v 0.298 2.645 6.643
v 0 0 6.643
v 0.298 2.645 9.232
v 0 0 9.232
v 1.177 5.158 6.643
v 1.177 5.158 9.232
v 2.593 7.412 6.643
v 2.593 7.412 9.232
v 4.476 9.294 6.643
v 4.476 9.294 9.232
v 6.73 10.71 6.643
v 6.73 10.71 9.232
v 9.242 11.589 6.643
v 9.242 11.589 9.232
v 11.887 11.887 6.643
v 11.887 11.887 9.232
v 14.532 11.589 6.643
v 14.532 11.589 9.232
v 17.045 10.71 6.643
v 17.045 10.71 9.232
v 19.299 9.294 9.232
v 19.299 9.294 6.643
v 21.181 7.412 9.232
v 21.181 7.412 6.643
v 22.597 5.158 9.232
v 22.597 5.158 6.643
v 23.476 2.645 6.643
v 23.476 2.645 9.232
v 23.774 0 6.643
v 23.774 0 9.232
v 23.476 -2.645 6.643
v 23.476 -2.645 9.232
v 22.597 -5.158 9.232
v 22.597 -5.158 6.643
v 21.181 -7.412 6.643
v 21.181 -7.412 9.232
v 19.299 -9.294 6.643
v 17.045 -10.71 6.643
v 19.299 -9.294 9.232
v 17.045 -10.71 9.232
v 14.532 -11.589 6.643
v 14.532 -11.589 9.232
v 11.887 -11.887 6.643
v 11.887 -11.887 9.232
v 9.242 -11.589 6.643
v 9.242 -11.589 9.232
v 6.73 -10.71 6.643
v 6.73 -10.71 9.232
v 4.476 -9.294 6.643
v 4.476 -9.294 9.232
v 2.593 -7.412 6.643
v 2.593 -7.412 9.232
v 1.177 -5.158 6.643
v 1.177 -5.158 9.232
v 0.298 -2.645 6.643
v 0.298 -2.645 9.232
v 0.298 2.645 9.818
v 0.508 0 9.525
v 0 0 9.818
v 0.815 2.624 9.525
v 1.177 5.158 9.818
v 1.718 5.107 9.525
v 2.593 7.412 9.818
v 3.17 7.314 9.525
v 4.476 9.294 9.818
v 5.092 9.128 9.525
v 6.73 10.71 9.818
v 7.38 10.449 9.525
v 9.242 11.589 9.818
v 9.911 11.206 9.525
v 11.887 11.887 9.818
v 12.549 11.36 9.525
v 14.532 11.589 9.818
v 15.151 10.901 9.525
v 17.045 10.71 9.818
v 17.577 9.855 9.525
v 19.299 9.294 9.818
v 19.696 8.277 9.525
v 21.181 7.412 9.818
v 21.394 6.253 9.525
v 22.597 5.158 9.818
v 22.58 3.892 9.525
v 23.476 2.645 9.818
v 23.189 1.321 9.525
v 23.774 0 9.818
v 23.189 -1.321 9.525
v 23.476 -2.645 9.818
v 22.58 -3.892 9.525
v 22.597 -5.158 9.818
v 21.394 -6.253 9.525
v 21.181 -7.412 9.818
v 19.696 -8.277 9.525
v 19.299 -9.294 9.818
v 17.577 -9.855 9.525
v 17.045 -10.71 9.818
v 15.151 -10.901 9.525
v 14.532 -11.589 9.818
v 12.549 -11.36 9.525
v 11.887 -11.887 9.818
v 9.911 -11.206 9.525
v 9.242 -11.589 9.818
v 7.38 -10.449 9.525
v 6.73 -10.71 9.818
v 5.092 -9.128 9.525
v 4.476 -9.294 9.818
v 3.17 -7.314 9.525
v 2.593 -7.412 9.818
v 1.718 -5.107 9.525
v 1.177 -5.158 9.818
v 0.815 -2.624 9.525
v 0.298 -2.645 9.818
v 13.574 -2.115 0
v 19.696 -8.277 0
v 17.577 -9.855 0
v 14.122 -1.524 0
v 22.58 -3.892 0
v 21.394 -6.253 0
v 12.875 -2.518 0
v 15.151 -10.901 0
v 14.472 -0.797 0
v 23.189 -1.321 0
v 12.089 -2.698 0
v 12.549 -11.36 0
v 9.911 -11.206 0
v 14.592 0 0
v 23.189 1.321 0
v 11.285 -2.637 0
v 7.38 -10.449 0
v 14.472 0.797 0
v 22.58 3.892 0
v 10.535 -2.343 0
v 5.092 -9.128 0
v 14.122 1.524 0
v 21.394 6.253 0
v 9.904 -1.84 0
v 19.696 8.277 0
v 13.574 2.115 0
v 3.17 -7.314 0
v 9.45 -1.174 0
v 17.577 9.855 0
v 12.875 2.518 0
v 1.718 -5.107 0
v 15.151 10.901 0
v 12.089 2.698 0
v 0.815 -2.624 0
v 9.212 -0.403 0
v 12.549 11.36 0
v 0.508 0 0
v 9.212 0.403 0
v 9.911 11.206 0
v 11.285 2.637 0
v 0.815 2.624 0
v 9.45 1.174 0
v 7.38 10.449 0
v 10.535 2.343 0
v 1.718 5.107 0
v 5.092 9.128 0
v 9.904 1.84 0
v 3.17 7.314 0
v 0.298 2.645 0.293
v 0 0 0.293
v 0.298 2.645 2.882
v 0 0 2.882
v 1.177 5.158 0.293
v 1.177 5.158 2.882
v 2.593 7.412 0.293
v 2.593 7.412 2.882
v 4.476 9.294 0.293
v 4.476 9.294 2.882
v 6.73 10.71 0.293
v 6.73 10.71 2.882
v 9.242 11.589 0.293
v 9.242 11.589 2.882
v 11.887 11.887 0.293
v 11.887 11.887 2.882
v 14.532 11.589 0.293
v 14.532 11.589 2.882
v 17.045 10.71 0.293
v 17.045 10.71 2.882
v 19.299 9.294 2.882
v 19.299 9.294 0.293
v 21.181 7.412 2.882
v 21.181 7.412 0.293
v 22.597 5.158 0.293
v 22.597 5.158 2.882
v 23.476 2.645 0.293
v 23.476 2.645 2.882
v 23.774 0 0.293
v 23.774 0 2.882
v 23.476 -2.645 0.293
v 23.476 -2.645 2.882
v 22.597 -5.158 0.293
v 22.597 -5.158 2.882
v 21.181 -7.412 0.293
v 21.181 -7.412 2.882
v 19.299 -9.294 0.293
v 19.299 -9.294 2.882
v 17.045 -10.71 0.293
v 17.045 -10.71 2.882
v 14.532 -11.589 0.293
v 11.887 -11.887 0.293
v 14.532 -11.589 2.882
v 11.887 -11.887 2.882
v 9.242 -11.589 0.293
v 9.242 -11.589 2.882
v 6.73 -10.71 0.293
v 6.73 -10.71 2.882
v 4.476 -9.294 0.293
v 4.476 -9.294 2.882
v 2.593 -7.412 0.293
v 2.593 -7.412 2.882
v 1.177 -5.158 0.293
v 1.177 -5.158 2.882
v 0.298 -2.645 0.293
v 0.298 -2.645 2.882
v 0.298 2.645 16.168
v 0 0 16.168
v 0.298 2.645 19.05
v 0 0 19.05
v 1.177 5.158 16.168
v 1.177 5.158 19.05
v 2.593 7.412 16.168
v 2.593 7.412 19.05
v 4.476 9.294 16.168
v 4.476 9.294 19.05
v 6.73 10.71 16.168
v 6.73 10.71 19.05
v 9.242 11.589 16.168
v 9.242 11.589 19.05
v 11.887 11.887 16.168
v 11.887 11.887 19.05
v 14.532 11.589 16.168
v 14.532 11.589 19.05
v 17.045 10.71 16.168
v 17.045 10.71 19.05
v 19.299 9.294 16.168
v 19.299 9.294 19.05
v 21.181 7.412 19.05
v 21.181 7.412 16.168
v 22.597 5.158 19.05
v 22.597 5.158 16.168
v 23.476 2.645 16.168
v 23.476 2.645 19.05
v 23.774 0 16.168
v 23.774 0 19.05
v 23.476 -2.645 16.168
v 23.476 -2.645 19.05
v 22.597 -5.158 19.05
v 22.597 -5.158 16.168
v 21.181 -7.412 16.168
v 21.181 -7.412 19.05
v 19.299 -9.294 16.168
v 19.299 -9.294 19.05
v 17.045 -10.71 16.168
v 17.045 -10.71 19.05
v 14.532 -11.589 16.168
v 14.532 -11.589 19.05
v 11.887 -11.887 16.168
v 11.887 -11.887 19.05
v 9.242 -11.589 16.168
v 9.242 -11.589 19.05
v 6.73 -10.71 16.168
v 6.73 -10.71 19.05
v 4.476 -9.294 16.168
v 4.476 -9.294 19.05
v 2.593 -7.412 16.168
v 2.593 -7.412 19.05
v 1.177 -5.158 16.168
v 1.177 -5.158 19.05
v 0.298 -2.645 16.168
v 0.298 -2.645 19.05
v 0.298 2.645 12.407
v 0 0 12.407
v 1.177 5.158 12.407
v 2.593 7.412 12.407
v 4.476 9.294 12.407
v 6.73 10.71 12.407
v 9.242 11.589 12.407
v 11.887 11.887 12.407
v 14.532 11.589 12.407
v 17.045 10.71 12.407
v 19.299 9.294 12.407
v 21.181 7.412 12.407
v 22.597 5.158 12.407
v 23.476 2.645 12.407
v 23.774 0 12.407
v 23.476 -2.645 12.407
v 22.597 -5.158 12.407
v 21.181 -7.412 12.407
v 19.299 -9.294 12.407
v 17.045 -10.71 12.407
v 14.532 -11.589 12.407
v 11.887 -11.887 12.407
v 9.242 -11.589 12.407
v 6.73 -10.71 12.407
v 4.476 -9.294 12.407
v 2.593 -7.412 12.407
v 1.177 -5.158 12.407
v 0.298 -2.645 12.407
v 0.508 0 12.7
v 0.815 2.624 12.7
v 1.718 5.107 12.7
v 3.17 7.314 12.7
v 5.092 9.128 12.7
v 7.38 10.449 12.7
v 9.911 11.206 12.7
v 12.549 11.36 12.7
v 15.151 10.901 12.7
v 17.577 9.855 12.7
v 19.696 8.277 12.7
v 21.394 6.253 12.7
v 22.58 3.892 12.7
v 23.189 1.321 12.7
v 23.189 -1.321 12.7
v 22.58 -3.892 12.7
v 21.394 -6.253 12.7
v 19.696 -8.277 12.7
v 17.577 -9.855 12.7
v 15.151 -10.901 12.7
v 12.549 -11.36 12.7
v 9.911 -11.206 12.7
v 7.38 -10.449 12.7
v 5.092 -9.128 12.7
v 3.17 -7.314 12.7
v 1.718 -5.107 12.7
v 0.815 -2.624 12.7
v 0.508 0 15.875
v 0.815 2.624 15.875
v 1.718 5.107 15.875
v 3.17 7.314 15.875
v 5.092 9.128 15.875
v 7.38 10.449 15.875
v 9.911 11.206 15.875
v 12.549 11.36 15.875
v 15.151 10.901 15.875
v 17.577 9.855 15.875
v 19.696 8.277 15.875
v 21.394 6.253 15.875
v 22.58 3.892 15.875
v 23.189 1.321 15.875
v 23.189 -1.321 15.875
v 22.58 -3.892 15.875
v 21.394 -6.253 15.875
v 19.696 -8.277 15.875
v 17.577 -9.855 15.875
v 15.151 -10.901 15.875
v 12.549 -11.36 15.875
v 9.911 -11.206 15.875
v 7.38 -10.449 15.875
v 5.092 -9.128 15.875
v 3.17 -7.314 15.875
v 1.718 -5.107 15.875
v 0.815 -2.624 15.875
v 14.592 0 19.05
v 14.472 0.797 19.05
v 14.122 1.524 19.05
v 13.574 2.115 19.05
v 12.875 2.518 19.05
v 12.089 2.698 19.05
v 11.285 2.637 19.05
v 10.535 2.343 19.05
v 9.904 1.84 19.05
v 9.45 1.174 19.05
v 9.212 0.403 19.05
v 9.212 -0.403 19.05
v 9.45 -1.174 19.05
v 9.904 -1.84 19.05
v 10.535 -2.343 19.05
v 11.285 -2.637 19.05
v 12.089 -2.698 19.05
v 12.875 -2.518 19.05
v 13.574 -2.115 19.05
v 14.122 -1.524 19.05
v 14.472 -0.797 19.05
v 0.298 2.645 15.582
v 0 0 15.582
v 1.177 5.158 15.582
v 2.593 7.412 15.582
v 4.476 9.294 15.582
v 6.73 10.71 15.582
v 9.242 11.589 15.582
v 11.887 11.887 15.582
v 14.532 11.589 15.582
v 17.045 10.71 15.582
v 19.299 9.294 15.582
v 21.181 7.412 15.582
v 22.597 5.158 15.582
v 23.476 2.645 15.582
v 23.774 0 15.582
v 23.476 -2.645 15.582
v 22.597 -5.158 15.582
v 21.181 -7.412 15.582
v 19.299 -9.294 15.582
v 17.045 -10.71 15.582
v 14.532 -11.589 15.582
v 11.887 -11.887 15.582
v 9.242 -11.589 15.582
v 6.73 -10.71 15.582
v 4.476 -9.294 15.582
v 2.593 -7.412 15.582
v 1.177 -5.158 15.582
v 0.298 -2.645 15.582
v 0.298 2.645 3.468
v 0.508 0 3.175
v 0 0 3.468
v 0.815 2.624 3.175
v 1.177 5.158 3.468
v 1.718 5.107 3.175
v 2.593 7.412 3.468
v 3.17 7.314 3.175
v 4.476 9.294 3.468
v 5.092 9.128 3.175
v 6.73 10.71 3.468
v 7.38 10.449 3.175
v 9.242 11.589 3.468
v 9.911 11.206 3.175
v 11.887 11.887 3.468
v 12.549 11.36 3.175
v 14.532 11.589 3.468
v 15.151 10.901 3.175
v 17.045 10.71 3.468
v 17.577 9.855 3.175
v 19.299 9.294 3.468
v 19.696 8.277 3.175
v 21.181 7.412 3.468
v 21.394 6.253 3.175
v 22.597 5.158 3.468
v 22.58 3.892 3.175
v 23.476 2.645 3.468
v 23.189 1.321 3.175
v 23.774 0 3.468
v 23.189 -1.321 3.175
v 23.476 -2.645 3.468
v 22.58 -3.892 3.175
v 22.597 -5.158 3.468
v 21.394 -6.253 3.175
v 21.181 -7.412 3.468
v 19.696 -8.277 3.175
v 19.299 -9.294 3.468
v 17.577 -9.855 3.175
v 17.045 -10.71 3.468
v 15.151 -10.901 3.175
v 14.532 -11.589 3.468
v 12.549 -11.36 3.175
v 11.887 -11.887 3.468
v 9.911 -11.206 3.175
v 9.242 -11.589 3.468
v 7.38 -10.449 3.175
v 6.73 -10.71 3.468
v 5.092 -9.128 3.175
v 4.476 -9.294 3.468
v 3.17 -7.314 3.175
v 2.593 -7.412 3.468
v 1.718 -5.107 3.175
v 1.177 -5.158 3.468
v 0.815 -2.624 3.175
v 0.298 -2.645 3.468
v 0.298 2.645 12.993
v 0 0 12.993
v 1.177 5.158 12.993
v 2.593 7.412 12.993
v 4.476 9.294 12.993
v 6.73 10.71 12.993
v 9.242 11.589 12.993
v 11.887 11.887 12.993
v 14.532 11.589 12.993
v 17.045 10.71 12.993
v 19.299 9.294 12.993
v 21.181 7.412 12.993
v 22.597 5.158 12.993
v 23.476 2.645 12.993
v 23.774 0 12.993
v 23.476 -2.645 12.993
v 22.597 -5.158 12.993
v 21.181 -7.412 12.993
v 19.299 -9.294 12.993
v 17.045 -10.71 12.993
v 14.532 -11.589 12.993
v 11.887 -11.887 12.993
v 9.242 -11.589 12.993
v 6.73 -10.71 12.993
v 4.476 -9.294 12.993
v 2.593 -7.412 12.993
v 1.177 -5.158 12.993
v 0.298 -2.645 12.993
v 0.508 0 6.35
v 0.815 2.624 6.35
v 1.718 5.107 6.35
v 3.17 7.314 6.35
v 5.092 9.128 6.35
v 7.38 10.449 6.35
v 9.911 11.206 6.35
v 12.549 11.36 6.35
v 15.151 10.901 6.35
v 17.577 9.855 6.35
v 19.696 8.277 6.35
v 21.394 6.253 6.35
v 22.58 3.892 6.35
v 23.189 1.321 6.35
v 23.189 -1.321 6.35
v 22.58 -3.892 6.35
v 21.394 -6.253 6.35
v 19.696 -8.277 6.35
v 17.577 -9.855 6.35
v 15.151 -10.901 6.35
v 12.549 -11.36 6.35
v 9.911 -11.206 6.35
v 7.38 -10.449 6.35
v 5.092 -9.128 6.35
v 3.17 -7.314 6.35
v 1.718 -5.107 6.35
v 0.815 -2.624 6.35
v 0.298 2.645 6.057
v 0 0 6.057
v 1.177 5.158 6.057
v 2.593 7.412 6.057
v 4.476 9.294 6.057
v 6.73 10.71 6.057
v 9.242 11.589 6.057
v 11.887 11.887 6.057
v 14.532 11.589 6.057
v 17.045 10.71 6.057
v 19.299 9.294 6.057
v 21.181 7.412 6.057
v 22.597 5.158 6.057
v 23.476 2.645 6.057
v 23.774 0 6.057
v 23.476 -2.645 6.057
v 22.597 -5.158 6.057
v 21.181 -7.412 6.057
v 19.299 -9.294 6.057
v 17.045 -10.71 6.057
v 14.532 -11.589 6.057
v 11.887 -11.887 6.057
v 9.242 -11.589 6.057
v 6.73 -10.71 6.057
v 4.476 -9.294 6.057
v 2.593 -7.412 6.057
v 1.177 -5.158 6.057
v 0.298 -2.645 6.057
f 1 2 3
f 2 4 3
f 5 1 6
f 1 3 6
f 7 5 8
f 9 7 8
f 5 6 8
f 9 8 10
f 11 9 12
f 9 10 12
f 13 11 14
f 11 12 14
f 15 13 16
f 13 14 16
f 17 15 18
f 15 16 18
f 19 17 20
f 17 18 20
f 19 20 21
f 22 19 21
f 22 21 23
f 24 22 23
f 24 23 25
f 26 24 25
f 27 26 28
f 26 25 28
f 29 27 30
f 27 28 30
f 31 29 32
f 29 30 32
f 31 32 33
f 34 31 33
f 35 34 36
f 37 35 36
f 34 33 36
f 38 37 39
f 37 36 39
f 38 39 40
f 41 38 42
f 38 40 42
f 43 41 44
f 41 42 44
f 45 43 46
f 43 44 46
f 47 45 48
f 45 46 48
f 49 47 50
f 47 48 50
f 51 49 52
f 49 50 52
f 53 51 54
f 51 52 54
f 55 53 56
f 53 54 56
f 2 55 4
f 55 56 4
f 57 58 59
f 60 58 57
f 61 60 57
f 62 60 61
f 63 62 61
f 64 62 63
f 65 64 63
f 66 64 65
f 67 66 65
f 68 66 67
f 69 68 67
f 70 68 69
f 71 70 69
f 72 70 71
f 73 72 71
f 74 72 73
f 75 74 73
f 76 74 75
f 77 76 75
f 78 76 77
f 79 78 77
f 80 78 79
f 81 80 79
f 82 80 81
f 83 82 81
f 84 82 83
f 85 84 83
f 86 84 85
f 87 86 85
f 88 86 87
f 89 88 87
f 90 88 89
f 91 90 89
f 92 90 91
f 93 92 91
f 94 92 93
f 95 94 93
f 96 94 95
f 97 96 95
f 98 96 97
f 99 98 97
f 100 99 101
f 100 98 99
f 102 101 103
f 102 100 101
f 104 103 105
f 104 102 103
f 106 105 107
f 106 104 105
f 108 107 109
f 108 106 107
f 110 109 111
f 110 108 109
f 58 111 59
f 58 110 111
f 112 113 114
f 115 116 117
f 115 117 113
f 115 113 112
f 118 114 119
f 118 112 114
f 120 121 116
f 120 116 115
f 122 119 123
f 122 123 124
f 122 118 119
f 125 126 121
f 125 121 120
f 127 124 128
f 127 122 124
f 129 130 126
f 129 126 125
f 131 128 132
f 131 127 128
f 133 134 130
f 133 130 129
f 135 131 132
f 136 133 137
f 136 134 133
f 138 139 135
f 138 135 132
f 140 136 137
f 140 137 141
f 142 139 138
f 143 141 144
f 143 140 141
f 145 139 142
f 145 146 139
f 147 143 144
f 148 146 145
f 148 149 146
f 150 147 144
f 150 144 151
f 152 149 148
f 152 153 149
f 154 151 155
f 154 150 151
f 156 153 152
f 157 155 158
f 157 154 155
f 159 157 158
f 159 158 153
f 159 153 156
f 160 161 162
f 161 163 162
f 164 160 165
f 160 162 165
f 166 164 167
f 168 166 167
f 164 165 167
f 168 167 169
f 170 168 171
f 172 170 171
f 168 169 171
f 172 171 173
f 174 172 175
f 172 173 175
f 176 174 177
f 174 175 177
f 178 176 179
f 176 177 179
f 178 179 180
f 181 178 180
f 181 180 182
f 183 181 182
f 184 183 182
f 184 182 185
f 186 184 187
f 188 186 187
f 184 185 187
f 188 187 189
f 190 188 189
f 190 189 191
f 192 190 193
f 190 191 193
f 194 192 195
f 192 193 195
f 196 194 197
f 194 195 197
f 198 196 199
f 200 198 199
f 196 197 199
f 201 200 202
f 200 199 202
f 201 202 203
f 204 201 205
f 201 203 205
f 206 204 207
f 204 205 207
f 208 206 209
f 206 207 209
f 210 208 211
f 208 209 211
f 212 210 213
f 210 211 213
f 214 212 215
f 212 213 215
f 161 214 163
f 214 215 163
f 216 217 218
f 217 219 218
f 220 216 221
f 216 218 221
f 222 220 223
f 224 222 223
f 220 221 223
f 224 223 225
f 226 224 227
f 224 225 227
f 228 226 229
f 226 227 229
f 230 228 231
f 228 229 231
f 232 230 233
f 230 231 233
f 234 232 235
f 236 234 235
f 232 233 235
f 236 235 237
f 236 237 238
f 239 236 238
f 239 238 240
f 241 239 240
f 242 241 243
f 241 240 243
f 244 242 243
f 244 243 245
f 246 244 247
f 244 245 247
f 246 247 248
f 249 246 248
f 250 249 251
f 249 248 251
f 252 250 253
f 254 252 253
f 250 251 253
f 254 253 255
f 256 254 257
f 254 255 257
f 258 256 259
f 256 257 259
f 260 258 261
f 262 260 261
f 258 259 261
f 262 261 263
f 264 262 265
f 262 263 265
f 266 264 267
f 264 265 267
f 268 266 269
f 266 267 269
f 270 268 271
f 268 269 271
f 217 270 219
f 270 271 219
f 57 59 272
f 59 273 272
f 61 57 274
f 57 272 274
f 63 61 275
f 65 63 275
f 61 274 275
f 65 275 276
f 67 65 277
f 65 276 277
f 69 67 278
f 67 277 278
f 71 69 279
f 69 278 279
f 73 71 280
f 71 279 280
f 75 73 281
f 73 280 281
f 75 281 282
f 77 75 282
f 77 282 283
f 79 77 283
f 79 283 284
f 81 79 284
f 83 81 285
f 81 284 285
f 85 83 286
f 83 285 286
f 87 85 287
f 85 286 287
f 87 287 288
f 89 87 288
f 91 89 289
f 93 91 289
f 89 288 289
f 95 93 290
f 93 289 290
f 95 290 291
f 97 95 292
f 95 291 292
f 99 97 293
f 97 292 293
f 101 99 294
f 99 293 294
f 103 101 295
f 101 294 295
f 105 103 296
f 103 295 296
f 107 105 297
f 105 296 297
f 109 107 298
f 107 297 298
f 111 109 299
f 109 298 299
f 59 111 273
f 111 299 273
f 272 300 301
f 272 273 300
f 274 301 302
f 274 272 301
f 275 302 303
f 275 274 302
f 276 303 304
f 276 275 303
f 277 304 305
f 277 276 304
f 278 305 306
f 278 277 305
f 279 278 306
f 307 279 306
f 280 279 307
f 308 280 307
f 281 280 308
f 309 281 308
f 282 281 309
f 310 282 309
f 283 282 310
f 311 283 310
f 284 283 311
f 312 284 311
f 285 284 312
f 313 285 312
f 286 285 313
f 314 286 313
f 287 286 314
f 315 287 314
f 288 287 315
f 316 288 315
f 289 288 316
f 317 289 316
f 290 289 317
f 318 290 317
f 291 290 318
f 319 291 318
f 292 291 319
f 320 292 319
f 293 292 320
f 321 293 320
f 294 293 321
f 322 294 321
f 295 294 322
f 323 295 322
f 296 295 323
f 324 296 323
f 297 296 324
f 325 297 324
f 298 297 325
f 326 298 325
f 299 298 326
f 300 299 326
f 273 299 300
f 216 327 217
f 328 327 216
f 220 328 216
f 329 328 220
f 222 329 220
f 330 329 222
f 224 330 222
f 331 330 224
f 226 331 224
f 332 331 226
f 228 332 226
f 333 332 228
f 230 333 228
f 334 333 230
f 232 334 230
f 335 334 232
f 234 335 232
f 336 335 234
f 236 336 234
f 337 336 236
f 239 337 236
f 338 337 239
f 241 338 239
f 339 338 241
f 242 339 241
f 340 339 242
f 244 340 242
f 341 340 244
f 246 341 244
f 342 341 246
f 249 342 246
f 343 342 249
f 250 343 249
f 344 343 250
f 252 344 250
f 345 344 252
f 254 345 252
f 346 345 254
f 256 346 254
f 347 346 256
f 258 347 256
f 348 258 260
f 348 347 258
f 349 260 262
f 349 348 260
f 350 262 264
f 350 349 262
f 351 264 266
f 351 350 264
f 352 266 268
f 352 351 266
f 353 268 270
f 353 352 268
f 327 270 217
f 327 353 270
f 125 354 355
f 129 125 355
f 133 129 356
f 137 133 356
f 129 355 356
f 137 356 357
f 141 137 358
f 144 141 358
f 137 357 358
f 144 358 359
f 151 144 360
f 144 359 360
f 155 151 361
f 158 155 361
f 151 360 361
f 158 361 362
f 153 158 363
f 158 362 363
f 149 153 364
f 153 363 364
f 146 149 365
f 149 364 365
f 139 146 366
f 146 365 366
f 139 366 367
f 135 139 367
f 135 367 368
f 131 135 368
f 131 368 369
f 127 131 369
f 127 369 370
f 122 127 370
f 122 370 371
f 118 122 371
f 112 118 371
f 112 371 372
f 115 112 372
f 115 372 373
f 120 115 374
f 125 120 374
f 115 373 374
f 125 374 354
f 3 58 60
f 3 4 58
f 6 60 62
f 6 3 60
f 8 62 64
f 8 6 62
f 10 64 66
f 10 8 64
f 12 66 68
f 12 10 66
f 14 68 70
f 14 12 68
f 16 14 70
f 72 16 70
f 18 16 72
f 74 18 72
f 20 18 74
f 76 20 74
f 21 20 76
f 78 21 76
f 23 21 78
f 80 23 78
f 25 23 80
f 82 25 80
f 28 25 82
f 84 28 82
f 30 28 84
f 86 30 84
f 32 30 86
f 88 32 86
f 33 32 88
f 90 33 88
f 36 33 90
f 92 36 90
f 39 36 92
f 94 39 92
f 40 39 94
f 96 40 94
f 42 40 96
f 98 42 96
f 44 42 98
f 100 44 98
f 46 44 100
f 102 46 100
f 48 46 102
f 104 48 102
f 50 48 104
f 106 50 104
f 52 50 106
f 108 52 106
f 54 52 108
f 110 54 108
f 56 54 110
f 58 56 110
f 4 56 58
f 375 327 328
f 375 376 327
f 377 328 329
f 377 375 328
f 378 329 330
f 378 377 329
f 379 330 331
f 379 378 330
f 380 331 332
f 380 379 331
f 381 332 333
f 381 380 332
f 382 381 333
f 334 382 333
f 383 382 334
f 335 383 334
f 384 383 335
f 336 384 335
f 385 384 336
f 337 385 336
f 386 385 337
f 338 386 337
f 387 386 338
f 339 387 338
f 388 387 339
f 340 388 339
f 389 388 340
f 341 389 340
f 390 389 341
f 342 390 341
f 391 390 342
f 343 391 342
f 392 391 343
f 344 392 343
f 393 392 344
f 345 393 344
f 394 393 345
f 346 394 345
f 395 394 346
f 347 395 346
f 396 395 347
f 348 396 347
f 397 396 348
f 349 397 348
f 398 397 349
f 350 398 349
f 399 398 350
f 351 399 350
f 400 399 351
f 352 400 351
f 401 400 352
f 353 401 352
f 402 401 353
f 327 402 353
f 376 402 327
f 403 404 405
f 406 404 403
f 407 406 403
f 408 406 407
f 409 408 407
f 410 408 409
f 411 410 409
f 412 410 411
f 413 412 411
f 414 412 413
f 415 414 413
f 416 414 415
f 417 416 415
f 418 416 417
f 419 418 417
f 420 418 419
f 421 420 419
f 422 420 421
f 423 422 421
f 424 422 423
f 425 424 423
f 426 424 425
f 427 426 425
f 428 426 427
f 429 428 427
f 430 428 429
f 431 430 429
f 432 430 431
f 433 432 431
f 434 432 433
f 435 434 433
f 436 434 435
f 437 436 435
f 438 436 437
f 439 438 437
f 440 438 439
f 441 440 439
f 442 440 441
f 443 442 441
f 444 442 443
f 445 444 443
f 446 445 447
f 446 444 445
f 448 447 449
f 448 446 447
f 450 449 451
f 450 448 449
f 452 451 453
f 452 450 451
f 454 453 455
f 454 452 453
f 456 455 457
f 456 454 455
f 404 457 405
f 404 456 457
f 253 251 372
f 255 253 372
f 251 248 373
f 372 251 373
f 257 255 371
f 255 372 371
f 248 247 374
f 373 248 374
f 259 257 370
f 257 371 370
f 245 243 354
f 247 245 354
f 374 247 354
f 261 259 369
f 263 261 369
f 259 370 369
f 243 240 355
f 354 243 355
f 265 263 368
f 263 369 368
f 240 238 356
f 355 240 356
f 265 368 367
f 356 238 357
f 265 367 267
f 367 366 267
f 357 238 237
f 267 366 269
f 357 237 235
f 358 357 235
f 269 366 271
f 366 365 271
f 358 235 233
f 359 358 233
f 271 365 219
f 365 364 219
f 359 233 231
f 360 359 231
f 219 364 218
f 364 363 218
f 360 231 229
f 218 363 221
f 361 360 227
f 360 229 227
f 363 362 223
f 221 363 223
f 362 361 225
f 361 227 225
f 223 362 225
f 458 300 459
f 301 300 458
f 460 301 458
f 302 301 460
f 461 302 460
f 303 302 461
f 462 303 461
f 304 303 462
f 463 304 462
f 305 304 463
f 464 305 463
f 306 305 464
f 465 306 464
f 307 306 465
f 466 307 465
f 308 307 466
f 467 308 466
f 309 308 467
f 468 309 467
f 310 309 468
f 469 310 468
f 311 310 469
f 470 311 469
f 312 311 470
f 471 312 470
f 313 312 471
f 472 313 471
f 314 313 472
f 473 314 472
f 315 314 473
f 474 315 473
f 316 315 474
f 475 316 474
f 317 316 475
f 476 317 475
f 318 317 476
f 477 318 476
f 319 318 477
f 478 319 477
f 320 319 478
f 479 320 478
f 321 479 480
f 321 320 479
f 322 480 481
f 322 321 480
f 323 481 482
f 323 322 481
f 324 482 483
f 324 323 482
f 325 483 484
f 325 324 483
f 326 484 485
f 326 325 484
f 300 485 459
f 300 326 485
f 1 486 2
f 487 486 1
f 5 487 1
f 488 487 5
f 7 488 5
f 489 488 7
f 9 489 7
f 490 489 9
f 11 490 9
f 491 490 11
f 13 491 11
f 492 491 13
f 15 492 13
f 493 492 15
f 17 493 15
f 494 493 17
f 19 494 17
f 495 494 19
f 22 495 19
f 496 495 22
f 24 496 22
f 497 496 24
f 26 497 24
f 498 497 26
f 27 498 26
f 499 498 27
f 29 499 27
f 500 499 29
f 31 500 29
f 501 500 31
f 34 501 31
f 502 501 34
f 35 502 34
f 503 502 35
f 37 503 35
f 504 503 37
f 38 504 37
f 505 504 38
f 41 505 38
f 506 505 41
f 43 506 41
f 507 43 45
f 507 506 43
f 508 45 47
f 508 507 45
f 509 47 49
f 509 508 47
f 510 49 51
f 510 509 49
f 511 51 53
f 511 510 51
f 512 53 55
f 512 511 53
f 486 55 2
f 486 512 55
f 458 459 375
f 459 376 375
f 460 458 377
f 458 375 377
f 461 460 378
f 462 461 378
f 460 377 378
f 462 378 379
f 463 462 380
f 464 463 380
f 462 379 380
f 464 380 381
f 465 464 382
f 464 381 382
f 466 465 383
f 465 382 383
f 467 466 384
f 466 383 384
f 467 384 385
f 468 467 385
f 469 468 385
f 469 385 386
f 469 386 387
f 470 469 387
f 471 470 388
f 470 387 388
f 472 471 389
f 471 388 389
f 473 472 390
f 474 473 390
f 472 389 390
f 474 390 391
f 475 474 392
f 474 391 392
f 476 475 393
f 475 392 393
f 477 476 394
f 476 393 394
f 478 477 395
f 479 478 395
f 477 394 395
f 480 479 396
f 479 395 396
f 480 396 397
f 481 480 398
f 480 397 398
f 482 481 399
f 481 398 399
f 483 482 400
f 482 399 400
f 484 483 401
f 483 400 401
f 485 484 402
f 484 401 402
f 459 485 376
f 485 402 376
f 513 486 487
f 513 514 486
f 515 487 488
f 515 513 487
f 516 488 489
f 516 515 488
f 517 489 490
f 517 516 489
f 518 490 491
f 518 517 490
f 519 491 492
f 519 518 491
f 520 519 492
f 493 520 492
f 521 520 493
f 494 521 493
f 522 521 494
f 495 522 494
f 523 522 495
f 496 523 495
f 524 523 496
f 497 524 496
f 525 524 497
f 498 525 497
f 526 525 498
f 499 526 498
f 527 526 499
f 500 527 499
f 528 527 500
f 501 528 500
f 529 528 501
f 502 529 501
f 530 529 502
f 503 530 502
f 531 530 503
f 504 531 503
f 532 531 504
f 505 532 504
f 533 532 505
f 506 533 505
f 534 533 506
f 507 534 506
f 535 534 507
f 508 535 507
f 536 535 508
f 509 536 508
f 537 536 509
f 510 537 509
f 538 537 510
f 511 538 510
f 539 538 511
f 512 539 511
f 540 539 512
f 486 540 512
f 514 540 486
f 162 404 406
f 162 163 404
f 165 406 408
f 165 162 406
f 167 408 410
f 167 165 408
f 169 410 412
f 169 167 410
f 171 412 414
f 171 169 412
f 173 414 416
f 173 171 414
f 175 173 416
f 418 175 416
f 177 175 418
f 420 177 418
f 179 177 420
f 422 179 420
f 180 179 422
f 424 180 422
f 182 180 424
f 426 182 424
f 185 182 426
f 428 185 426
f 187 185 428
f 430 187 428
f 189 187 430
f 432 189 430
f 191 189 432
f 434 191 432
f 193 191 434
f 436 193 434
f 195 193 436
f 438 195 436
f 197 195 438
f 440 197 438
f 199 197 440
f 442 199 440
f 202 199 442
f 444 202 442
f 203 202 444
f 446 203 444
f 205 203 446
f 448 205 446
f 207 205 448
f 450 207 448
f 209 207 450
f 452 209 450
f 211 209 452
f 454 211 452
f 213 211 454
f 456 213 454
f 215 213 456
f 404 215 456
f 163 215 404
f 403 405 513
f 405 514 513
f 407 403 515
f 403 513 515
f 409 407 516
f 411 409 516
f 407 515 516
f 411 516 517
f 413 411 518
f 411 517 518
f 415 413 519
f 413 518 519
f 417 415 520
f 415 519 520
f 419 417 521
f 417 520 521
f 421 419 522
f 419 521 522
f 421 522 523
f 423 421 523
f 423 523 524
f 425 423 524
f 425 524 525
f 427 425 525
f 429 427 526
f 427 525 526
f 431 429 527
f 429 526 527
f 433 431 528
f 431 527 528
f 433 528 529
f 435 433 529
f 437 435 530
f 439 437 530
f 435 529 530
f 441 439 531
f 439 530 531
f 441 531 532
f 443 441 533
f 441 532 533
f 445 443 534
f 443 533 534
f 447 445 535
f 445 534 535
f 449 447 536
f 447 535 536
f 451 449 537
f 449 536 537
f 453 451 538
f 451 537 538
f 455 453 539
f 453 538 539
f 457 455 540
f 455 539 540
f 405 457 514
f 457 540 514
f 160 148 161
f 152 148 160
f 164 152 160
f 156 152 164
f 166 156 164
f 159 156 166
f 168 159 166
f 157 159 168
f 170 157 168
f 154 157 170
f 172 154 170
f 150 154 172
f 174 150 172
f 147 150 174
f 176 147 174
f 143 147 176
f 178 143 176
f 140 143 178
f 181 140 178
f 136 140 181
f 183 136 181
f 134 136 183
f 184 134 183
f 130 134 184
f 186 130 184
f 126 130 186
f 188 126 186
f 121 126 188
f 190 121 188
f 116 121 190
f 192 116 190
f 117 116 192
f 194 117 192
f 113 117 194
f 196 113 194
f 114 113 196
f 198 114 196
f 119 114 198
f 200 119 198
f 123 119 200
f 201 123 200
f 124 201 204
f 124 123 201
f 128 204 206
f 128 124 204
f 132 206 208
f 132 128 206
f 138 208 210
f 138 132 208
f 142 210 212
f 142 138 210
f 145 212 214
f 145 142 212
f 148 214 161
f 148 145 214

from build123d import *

# Parameters (mm, degrees)
F0_W     = 11.8872
F0_H     = 2.881706
F0_H_2   = 2.588412
F2_R     = 2.7051
F3_DEPTH = 19.05


with BuildPart() as f1:
    # F0 (on Front) → F1 (revolve)
    with BuildSketch(Plane.XZ):
        with Locations((5.9436, 17.609147)):
            Rectangle(F0_W, F0_H)
        Polygon((11.8872, 16.168294), (0, 16.168294), (0.508, 15.875), (11.8872, 15.875), align=None)
        Polygon((0.508, 15.875), (0, 15.581706), (11.8872, 15.581706), (11.8872, 15.875), align=None)
        with Locations((5.9436, 14.2875)):
            Rectangle(F0_W, F0_H_2)
        Polygon((11.8872, 12.993294), (0, 12.993294), (0.508, 12.7), (11.8872, 12.7), align=None)
        Polygon((0.508, 12.7), (0, 12.406706), (11.8872, 12.406706), (11.8872, 12.7), align=None)
        with Locations((5.9436, 11.1125)):
            Rectangle(F0_W, F0_H_2)
        Polygon((11.8872, 9.818294), (0, 9.818294), (0.508, 9.525), (11.8872, 9.525), align=None)
        Polygon((0.508, 9.525), (0, 9.231706), (11.8872, 9.231706), (11.8872, 9.525), align=None)
        with Locations((5.9436, 7.9375)):
            Rectangle(F0_W, F0_H_2)
        Polygon((11.8872, 6.643294), (0, 6.643294), (0.508, 6.35), (11.8872, 6.35), align=None)
        Polygon((0.508, 6.35), (0, 6.056706), (11.8872, 6.056706), (11.8872, 6.35), align=None)
        with Locations((5.9436, 4.7625)):
            Rectangle(F0_W, F0_H_2)
        Polygon((11.8872, 3.468294), (0, 3.468294), (0.508, 3.175), (11.8872, 3.175), align=None)
        Polygon((0.508, 3.175), (0, 2.881706), (11.8872, 2.881706), (11.8872, 3.175), align=None)
        with Locations((5.9436, 1.5875)):
            Rectangle(F0_W, F0_H_2)
        Polygon((0, 0.293294), (0.508, 0), (11.8872, 0), (11.8872, 0.293294), align=None)
    revolve(axis=Axis((11.8872, 0, 9.525), (0, 0, -1)))

    # F2 (on face) → F3 (cut, through all)
    with BuildSketch(Plane.XY.offset(19.05)):
        with Locations((11.8872, 0)):
            Circle(F2_R)
    extrude(amount=-F3_DEPTH, mode=Mode.SUBTRACT)


solid = f1.part
